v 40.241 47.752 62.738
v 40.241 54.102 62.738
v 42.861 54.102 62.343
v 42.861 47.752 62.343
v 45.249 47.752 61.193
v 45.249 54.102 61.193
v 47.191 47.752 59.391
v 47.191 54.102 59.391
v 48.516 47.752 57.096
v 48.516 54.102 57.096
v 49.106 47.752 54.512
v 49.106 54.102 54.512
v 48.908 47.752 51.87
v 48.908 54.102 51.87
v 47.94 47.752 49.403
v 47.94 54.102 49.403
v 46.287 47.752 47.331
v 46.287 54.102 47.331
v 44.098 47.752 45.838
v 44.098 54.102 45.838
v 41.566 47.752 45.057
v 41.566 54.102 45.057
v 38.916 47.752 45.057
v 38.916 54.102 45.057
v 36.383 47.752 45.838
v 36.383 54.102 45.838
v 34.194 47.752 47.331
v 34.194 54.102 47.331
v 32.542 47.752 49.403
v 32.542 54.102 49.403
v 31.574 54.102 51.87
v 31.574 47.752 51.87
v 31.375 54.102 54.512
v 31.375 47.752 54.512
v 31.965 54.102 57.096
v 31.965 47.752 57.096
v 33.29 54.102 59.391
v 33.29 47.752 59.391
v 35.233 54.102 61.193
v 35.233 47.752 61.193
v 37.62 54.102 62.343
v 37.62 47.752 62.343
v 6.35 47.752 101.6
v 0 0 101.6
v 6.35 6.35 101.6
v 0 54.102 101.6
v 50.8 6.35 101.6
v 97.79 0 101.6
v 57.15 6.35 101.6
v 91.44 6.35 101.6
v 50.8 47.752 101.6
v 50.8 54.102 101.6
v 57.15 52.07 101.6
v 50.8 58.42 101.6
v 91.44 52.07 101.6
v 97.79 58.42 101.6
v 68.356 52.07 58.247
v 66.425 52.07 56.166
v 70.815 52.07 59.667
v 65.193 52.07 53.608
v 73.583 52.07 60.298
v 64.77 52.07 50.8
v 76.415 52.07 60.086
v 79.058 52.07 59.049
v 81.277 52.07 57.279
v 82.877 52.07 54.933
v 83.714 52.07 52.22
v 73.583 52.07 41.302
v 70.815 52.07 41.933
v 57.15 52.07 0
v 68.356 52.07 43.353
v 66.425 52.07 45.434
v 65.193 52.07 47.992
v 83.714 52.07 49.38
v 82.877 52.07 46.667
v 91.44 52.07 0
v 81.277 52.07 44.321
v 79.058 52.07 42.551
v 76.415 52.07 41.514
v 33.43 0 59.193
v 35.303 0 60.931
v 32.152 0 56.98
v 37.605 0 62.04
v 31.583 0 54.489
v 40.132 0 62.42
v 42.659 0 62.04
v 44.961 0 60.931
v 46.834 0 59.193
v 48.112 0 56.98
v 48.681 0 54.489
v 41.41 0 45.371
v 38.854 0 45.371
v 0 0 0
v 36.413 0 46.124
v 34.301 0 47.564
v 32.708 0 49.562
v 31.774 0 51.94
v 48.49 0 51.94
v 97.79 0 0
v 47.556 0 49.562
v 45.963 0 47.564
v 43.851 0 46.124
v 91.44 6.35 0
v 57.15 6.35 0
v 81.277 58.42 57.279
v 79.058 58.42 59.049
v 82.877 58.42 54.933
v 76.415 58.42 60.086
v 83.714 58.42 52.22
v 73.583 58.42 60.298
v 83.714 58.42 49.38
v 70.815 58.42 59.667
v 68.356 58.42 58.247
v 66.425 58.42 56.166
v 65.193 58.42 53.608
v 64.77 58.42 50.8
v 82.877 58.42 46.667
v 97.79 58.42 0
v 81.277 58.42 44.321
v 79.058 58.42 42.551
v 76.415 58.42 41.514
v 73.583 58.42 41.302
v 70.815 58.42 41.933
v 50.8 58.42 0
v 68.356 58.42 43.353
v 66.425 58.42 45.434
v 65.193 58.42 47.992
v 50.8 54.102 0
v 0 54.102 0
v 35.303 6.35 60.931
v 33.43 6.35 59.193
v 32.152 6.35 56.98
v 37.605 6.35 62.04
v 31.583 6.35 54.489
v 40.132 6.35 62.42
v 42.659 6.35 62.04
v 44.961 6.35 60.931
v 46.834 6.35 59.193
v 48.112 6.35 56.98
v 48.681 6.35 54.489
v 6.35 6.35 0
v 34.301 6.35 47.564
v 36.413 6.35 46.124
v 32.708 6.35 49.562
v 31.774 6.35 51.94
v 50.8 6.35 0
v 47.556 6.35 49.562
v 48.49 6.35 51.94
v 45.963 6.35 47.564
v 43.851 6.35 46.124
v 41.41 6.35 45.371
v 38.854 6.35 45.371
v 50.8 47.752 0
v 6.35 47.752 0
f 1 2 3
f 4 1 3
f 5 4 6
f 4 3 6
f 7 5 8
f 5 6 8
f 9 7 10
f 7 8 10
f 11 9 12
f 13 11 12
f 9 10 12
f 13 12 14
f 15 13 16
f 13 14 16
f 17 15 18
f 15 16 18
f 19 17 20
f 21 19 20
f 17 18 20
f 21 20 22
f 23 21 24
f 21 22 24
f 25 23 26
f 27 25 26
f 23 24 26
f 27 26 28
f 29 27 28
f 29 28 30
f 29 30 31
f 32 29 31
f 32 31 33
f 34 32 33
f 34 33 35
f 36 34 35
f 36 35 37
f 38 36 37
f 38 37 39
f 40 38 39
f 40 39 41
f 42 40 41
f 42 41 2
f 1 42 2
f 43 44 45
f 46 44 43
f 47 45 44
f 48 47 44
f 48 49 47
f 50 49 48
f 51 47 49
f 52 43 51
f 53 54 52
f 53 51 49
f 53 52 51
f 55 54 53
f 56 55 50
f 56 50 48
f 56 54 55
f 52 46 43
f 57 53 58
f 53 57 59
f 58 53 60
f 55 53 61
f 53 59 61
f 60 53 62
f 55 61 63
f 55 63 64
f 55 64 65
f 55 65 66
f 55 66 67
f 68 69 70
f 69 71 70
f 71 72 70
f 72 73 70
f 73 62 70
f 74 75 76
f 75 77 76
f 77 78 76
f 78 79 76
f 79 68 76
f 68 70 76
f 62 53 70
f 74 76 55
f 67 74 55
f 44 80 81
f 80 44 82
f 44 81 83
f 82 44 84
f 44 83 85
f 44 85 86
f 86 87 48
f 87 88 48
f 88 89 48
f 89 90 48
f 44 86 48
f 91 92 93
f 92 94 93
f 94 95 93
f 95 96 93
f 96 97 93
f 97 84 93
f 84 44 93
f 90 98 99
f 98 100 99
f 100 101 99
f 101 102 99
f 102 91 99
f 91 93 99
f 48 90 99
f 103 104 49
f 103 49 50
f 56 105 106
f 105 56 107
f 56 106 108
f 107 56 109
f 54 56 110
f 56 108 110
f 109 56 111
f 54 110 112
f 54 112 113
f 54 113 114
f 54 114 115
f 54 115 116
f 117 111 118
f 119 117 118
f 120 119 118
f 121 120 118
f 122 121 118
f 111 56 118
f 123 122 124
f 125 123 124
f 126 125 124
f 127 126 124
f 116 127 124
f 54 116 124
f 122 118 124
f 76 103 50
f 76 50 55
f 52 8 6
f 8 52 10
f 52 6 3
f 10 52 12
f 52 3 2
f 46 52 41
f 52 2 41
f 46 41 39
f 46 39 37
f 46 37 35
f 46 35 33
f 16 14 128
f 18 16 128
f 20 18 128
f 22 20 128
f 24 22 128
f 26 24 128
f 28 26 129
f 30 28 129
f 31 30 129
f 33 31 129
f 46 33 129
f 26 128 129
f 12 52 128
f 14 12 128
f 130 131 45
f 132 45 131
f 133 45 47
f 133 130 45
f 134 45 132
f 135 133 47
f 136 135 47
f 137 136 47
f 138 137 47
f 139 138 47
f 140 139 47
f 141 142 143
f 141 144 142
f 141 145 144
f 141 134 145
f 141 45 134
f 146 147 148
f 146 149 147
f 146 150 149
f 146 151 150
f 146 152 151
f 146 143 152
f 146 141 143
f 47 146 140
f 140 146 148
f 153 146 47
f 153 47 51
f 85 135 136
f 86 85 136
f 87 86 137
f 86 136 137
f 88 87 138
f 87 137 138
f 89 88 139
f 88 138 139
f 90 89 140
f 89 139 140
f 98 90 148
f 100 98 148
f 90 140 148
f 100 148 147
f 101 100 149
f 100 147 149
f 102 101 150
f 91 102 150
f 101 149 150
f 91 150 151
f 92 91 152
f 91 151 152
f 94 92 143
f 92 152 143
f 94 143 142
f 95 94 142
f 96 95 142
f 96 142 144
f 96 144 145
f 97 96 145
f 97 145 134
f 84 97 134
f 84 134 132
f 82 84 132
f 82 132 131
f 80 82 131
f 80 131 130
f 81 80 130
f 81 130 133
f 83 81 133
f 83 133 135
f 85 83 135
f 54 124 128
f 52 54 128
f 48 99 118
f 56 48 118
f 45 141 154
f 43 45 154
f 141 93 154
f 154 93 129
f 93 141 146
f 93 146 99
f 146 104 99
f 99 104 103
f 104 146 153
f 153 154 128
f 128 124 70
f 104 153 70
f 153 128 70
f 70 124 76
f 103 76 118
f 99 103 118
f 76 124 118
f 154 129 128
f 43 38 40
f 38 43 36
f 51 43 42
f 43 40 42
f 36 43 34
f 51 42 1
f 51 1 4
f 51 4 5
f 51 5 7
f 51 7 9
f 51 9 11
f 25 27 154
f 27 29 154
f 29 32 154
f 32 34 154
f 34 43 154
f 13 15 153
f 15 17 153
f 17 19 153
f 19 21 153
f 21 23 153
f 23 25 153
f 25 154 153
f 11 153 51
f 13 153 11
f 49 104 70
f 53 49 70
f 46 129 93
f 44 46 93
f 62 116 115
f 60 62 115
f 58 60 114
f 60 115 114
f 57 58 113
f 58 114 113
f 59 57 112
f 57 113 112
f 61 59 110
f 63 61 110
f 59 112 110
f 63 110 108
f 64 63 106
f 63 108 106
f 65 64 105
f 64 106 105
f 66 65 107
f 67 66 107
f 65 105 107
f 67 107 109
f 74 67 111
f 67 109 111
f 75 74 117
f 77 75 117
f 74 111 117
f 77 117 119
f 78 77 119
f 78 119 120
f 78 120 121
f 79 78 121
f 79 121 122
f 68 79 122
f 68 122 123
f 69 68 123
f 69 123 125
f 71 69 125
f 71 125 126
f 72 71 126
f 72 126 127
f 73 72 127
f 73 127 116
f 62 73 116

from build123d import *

# Parameters (mm, degrees)
SKETCH1_W           = 44.45
SKETCH1_H           = 41.402
SKETCH1_W_2         = 34.29
SKETCH1_H_2         = 45.72
BOSS_EXTRUDE1_DEPTH = 101.6
SKETCH2_R           = 9.525
CUT_EXTRUDE1_DEPTH  = 12.7
SKETCH3_R           = 8.89
CUT_EXTRUDE2_DEPTH  = 12.7
SKETCH4_R           = 8.5725
CUT_EXTRUDE3_DEPTH  = 12.7


with BuildPart() as part:
    # Sketch1 → Boss-Extrude1 (new body)
    with BuildSketch(Plane.XY):
        Polygon((0, 0), (97.79, 0), (97.79, 58.42), (50.8, 58.42), (50.8, 54.102), (0, 54.102), align=None)
        with Locations((28.575, 27.051)):
            Rectangle(SKETCH1_W, SKETCH1_H, mode=Mode.SUBTRACT)
        with Locations((74.295, 29.21)):
            Rectangle(SKETCH1_W_2, SKETCH1_H_2, mode=Mode.SUBTRACT)
    extrude(amount=BOSS_EXTRUDE1_DEPTH)

    # Sketch2 → Cut-Extrude1 (cut)
    with BuildSketch(Plane(origin=(0, 58.42, 0), x_dir=(1, 0, 0), z_dir=(0, 1, 0))):
        with Locations(Location((74.295, -50.8, 0), (0, 0, 180))):
            Circle(SKETCH2_R)
    extrude(amount=-CUT_EXTRUDE1_DEPTH, mode=Mode.SUBTRACT)

    # Sketch3 → Cut-Extrude2 (cut)
    with BuildSketch(Plane(origin=(0, 54.102, 0), x_dir=(1, 0, 0), z_dir=(0, 1, 0))):
        with Locations(Location((40.240640863, -53.848, 0), (0, 0, 270))):
            Circle(SKETCH3_R)
    extrude(amount=-CUT_EXTRUDE2_DEPTH, mode=Mode.SUBTRACT)

    # Sketch4 → Cut-Extrude3 (cut)
    with BuildSketch(Plane(origin=(0, 6.35, 0), x_dir=(1, 0, 0), z_dir=(0, 1, 0))):
        with Locations(Location((40.132, -53.848, 0), (0, 0, 270))):
            Circle(SKETCH4_R)
    extrude(amount=-CUT_EXTRUDE3_DEPTH, mode=Mode.SUBTRACT)


solid = part.part
